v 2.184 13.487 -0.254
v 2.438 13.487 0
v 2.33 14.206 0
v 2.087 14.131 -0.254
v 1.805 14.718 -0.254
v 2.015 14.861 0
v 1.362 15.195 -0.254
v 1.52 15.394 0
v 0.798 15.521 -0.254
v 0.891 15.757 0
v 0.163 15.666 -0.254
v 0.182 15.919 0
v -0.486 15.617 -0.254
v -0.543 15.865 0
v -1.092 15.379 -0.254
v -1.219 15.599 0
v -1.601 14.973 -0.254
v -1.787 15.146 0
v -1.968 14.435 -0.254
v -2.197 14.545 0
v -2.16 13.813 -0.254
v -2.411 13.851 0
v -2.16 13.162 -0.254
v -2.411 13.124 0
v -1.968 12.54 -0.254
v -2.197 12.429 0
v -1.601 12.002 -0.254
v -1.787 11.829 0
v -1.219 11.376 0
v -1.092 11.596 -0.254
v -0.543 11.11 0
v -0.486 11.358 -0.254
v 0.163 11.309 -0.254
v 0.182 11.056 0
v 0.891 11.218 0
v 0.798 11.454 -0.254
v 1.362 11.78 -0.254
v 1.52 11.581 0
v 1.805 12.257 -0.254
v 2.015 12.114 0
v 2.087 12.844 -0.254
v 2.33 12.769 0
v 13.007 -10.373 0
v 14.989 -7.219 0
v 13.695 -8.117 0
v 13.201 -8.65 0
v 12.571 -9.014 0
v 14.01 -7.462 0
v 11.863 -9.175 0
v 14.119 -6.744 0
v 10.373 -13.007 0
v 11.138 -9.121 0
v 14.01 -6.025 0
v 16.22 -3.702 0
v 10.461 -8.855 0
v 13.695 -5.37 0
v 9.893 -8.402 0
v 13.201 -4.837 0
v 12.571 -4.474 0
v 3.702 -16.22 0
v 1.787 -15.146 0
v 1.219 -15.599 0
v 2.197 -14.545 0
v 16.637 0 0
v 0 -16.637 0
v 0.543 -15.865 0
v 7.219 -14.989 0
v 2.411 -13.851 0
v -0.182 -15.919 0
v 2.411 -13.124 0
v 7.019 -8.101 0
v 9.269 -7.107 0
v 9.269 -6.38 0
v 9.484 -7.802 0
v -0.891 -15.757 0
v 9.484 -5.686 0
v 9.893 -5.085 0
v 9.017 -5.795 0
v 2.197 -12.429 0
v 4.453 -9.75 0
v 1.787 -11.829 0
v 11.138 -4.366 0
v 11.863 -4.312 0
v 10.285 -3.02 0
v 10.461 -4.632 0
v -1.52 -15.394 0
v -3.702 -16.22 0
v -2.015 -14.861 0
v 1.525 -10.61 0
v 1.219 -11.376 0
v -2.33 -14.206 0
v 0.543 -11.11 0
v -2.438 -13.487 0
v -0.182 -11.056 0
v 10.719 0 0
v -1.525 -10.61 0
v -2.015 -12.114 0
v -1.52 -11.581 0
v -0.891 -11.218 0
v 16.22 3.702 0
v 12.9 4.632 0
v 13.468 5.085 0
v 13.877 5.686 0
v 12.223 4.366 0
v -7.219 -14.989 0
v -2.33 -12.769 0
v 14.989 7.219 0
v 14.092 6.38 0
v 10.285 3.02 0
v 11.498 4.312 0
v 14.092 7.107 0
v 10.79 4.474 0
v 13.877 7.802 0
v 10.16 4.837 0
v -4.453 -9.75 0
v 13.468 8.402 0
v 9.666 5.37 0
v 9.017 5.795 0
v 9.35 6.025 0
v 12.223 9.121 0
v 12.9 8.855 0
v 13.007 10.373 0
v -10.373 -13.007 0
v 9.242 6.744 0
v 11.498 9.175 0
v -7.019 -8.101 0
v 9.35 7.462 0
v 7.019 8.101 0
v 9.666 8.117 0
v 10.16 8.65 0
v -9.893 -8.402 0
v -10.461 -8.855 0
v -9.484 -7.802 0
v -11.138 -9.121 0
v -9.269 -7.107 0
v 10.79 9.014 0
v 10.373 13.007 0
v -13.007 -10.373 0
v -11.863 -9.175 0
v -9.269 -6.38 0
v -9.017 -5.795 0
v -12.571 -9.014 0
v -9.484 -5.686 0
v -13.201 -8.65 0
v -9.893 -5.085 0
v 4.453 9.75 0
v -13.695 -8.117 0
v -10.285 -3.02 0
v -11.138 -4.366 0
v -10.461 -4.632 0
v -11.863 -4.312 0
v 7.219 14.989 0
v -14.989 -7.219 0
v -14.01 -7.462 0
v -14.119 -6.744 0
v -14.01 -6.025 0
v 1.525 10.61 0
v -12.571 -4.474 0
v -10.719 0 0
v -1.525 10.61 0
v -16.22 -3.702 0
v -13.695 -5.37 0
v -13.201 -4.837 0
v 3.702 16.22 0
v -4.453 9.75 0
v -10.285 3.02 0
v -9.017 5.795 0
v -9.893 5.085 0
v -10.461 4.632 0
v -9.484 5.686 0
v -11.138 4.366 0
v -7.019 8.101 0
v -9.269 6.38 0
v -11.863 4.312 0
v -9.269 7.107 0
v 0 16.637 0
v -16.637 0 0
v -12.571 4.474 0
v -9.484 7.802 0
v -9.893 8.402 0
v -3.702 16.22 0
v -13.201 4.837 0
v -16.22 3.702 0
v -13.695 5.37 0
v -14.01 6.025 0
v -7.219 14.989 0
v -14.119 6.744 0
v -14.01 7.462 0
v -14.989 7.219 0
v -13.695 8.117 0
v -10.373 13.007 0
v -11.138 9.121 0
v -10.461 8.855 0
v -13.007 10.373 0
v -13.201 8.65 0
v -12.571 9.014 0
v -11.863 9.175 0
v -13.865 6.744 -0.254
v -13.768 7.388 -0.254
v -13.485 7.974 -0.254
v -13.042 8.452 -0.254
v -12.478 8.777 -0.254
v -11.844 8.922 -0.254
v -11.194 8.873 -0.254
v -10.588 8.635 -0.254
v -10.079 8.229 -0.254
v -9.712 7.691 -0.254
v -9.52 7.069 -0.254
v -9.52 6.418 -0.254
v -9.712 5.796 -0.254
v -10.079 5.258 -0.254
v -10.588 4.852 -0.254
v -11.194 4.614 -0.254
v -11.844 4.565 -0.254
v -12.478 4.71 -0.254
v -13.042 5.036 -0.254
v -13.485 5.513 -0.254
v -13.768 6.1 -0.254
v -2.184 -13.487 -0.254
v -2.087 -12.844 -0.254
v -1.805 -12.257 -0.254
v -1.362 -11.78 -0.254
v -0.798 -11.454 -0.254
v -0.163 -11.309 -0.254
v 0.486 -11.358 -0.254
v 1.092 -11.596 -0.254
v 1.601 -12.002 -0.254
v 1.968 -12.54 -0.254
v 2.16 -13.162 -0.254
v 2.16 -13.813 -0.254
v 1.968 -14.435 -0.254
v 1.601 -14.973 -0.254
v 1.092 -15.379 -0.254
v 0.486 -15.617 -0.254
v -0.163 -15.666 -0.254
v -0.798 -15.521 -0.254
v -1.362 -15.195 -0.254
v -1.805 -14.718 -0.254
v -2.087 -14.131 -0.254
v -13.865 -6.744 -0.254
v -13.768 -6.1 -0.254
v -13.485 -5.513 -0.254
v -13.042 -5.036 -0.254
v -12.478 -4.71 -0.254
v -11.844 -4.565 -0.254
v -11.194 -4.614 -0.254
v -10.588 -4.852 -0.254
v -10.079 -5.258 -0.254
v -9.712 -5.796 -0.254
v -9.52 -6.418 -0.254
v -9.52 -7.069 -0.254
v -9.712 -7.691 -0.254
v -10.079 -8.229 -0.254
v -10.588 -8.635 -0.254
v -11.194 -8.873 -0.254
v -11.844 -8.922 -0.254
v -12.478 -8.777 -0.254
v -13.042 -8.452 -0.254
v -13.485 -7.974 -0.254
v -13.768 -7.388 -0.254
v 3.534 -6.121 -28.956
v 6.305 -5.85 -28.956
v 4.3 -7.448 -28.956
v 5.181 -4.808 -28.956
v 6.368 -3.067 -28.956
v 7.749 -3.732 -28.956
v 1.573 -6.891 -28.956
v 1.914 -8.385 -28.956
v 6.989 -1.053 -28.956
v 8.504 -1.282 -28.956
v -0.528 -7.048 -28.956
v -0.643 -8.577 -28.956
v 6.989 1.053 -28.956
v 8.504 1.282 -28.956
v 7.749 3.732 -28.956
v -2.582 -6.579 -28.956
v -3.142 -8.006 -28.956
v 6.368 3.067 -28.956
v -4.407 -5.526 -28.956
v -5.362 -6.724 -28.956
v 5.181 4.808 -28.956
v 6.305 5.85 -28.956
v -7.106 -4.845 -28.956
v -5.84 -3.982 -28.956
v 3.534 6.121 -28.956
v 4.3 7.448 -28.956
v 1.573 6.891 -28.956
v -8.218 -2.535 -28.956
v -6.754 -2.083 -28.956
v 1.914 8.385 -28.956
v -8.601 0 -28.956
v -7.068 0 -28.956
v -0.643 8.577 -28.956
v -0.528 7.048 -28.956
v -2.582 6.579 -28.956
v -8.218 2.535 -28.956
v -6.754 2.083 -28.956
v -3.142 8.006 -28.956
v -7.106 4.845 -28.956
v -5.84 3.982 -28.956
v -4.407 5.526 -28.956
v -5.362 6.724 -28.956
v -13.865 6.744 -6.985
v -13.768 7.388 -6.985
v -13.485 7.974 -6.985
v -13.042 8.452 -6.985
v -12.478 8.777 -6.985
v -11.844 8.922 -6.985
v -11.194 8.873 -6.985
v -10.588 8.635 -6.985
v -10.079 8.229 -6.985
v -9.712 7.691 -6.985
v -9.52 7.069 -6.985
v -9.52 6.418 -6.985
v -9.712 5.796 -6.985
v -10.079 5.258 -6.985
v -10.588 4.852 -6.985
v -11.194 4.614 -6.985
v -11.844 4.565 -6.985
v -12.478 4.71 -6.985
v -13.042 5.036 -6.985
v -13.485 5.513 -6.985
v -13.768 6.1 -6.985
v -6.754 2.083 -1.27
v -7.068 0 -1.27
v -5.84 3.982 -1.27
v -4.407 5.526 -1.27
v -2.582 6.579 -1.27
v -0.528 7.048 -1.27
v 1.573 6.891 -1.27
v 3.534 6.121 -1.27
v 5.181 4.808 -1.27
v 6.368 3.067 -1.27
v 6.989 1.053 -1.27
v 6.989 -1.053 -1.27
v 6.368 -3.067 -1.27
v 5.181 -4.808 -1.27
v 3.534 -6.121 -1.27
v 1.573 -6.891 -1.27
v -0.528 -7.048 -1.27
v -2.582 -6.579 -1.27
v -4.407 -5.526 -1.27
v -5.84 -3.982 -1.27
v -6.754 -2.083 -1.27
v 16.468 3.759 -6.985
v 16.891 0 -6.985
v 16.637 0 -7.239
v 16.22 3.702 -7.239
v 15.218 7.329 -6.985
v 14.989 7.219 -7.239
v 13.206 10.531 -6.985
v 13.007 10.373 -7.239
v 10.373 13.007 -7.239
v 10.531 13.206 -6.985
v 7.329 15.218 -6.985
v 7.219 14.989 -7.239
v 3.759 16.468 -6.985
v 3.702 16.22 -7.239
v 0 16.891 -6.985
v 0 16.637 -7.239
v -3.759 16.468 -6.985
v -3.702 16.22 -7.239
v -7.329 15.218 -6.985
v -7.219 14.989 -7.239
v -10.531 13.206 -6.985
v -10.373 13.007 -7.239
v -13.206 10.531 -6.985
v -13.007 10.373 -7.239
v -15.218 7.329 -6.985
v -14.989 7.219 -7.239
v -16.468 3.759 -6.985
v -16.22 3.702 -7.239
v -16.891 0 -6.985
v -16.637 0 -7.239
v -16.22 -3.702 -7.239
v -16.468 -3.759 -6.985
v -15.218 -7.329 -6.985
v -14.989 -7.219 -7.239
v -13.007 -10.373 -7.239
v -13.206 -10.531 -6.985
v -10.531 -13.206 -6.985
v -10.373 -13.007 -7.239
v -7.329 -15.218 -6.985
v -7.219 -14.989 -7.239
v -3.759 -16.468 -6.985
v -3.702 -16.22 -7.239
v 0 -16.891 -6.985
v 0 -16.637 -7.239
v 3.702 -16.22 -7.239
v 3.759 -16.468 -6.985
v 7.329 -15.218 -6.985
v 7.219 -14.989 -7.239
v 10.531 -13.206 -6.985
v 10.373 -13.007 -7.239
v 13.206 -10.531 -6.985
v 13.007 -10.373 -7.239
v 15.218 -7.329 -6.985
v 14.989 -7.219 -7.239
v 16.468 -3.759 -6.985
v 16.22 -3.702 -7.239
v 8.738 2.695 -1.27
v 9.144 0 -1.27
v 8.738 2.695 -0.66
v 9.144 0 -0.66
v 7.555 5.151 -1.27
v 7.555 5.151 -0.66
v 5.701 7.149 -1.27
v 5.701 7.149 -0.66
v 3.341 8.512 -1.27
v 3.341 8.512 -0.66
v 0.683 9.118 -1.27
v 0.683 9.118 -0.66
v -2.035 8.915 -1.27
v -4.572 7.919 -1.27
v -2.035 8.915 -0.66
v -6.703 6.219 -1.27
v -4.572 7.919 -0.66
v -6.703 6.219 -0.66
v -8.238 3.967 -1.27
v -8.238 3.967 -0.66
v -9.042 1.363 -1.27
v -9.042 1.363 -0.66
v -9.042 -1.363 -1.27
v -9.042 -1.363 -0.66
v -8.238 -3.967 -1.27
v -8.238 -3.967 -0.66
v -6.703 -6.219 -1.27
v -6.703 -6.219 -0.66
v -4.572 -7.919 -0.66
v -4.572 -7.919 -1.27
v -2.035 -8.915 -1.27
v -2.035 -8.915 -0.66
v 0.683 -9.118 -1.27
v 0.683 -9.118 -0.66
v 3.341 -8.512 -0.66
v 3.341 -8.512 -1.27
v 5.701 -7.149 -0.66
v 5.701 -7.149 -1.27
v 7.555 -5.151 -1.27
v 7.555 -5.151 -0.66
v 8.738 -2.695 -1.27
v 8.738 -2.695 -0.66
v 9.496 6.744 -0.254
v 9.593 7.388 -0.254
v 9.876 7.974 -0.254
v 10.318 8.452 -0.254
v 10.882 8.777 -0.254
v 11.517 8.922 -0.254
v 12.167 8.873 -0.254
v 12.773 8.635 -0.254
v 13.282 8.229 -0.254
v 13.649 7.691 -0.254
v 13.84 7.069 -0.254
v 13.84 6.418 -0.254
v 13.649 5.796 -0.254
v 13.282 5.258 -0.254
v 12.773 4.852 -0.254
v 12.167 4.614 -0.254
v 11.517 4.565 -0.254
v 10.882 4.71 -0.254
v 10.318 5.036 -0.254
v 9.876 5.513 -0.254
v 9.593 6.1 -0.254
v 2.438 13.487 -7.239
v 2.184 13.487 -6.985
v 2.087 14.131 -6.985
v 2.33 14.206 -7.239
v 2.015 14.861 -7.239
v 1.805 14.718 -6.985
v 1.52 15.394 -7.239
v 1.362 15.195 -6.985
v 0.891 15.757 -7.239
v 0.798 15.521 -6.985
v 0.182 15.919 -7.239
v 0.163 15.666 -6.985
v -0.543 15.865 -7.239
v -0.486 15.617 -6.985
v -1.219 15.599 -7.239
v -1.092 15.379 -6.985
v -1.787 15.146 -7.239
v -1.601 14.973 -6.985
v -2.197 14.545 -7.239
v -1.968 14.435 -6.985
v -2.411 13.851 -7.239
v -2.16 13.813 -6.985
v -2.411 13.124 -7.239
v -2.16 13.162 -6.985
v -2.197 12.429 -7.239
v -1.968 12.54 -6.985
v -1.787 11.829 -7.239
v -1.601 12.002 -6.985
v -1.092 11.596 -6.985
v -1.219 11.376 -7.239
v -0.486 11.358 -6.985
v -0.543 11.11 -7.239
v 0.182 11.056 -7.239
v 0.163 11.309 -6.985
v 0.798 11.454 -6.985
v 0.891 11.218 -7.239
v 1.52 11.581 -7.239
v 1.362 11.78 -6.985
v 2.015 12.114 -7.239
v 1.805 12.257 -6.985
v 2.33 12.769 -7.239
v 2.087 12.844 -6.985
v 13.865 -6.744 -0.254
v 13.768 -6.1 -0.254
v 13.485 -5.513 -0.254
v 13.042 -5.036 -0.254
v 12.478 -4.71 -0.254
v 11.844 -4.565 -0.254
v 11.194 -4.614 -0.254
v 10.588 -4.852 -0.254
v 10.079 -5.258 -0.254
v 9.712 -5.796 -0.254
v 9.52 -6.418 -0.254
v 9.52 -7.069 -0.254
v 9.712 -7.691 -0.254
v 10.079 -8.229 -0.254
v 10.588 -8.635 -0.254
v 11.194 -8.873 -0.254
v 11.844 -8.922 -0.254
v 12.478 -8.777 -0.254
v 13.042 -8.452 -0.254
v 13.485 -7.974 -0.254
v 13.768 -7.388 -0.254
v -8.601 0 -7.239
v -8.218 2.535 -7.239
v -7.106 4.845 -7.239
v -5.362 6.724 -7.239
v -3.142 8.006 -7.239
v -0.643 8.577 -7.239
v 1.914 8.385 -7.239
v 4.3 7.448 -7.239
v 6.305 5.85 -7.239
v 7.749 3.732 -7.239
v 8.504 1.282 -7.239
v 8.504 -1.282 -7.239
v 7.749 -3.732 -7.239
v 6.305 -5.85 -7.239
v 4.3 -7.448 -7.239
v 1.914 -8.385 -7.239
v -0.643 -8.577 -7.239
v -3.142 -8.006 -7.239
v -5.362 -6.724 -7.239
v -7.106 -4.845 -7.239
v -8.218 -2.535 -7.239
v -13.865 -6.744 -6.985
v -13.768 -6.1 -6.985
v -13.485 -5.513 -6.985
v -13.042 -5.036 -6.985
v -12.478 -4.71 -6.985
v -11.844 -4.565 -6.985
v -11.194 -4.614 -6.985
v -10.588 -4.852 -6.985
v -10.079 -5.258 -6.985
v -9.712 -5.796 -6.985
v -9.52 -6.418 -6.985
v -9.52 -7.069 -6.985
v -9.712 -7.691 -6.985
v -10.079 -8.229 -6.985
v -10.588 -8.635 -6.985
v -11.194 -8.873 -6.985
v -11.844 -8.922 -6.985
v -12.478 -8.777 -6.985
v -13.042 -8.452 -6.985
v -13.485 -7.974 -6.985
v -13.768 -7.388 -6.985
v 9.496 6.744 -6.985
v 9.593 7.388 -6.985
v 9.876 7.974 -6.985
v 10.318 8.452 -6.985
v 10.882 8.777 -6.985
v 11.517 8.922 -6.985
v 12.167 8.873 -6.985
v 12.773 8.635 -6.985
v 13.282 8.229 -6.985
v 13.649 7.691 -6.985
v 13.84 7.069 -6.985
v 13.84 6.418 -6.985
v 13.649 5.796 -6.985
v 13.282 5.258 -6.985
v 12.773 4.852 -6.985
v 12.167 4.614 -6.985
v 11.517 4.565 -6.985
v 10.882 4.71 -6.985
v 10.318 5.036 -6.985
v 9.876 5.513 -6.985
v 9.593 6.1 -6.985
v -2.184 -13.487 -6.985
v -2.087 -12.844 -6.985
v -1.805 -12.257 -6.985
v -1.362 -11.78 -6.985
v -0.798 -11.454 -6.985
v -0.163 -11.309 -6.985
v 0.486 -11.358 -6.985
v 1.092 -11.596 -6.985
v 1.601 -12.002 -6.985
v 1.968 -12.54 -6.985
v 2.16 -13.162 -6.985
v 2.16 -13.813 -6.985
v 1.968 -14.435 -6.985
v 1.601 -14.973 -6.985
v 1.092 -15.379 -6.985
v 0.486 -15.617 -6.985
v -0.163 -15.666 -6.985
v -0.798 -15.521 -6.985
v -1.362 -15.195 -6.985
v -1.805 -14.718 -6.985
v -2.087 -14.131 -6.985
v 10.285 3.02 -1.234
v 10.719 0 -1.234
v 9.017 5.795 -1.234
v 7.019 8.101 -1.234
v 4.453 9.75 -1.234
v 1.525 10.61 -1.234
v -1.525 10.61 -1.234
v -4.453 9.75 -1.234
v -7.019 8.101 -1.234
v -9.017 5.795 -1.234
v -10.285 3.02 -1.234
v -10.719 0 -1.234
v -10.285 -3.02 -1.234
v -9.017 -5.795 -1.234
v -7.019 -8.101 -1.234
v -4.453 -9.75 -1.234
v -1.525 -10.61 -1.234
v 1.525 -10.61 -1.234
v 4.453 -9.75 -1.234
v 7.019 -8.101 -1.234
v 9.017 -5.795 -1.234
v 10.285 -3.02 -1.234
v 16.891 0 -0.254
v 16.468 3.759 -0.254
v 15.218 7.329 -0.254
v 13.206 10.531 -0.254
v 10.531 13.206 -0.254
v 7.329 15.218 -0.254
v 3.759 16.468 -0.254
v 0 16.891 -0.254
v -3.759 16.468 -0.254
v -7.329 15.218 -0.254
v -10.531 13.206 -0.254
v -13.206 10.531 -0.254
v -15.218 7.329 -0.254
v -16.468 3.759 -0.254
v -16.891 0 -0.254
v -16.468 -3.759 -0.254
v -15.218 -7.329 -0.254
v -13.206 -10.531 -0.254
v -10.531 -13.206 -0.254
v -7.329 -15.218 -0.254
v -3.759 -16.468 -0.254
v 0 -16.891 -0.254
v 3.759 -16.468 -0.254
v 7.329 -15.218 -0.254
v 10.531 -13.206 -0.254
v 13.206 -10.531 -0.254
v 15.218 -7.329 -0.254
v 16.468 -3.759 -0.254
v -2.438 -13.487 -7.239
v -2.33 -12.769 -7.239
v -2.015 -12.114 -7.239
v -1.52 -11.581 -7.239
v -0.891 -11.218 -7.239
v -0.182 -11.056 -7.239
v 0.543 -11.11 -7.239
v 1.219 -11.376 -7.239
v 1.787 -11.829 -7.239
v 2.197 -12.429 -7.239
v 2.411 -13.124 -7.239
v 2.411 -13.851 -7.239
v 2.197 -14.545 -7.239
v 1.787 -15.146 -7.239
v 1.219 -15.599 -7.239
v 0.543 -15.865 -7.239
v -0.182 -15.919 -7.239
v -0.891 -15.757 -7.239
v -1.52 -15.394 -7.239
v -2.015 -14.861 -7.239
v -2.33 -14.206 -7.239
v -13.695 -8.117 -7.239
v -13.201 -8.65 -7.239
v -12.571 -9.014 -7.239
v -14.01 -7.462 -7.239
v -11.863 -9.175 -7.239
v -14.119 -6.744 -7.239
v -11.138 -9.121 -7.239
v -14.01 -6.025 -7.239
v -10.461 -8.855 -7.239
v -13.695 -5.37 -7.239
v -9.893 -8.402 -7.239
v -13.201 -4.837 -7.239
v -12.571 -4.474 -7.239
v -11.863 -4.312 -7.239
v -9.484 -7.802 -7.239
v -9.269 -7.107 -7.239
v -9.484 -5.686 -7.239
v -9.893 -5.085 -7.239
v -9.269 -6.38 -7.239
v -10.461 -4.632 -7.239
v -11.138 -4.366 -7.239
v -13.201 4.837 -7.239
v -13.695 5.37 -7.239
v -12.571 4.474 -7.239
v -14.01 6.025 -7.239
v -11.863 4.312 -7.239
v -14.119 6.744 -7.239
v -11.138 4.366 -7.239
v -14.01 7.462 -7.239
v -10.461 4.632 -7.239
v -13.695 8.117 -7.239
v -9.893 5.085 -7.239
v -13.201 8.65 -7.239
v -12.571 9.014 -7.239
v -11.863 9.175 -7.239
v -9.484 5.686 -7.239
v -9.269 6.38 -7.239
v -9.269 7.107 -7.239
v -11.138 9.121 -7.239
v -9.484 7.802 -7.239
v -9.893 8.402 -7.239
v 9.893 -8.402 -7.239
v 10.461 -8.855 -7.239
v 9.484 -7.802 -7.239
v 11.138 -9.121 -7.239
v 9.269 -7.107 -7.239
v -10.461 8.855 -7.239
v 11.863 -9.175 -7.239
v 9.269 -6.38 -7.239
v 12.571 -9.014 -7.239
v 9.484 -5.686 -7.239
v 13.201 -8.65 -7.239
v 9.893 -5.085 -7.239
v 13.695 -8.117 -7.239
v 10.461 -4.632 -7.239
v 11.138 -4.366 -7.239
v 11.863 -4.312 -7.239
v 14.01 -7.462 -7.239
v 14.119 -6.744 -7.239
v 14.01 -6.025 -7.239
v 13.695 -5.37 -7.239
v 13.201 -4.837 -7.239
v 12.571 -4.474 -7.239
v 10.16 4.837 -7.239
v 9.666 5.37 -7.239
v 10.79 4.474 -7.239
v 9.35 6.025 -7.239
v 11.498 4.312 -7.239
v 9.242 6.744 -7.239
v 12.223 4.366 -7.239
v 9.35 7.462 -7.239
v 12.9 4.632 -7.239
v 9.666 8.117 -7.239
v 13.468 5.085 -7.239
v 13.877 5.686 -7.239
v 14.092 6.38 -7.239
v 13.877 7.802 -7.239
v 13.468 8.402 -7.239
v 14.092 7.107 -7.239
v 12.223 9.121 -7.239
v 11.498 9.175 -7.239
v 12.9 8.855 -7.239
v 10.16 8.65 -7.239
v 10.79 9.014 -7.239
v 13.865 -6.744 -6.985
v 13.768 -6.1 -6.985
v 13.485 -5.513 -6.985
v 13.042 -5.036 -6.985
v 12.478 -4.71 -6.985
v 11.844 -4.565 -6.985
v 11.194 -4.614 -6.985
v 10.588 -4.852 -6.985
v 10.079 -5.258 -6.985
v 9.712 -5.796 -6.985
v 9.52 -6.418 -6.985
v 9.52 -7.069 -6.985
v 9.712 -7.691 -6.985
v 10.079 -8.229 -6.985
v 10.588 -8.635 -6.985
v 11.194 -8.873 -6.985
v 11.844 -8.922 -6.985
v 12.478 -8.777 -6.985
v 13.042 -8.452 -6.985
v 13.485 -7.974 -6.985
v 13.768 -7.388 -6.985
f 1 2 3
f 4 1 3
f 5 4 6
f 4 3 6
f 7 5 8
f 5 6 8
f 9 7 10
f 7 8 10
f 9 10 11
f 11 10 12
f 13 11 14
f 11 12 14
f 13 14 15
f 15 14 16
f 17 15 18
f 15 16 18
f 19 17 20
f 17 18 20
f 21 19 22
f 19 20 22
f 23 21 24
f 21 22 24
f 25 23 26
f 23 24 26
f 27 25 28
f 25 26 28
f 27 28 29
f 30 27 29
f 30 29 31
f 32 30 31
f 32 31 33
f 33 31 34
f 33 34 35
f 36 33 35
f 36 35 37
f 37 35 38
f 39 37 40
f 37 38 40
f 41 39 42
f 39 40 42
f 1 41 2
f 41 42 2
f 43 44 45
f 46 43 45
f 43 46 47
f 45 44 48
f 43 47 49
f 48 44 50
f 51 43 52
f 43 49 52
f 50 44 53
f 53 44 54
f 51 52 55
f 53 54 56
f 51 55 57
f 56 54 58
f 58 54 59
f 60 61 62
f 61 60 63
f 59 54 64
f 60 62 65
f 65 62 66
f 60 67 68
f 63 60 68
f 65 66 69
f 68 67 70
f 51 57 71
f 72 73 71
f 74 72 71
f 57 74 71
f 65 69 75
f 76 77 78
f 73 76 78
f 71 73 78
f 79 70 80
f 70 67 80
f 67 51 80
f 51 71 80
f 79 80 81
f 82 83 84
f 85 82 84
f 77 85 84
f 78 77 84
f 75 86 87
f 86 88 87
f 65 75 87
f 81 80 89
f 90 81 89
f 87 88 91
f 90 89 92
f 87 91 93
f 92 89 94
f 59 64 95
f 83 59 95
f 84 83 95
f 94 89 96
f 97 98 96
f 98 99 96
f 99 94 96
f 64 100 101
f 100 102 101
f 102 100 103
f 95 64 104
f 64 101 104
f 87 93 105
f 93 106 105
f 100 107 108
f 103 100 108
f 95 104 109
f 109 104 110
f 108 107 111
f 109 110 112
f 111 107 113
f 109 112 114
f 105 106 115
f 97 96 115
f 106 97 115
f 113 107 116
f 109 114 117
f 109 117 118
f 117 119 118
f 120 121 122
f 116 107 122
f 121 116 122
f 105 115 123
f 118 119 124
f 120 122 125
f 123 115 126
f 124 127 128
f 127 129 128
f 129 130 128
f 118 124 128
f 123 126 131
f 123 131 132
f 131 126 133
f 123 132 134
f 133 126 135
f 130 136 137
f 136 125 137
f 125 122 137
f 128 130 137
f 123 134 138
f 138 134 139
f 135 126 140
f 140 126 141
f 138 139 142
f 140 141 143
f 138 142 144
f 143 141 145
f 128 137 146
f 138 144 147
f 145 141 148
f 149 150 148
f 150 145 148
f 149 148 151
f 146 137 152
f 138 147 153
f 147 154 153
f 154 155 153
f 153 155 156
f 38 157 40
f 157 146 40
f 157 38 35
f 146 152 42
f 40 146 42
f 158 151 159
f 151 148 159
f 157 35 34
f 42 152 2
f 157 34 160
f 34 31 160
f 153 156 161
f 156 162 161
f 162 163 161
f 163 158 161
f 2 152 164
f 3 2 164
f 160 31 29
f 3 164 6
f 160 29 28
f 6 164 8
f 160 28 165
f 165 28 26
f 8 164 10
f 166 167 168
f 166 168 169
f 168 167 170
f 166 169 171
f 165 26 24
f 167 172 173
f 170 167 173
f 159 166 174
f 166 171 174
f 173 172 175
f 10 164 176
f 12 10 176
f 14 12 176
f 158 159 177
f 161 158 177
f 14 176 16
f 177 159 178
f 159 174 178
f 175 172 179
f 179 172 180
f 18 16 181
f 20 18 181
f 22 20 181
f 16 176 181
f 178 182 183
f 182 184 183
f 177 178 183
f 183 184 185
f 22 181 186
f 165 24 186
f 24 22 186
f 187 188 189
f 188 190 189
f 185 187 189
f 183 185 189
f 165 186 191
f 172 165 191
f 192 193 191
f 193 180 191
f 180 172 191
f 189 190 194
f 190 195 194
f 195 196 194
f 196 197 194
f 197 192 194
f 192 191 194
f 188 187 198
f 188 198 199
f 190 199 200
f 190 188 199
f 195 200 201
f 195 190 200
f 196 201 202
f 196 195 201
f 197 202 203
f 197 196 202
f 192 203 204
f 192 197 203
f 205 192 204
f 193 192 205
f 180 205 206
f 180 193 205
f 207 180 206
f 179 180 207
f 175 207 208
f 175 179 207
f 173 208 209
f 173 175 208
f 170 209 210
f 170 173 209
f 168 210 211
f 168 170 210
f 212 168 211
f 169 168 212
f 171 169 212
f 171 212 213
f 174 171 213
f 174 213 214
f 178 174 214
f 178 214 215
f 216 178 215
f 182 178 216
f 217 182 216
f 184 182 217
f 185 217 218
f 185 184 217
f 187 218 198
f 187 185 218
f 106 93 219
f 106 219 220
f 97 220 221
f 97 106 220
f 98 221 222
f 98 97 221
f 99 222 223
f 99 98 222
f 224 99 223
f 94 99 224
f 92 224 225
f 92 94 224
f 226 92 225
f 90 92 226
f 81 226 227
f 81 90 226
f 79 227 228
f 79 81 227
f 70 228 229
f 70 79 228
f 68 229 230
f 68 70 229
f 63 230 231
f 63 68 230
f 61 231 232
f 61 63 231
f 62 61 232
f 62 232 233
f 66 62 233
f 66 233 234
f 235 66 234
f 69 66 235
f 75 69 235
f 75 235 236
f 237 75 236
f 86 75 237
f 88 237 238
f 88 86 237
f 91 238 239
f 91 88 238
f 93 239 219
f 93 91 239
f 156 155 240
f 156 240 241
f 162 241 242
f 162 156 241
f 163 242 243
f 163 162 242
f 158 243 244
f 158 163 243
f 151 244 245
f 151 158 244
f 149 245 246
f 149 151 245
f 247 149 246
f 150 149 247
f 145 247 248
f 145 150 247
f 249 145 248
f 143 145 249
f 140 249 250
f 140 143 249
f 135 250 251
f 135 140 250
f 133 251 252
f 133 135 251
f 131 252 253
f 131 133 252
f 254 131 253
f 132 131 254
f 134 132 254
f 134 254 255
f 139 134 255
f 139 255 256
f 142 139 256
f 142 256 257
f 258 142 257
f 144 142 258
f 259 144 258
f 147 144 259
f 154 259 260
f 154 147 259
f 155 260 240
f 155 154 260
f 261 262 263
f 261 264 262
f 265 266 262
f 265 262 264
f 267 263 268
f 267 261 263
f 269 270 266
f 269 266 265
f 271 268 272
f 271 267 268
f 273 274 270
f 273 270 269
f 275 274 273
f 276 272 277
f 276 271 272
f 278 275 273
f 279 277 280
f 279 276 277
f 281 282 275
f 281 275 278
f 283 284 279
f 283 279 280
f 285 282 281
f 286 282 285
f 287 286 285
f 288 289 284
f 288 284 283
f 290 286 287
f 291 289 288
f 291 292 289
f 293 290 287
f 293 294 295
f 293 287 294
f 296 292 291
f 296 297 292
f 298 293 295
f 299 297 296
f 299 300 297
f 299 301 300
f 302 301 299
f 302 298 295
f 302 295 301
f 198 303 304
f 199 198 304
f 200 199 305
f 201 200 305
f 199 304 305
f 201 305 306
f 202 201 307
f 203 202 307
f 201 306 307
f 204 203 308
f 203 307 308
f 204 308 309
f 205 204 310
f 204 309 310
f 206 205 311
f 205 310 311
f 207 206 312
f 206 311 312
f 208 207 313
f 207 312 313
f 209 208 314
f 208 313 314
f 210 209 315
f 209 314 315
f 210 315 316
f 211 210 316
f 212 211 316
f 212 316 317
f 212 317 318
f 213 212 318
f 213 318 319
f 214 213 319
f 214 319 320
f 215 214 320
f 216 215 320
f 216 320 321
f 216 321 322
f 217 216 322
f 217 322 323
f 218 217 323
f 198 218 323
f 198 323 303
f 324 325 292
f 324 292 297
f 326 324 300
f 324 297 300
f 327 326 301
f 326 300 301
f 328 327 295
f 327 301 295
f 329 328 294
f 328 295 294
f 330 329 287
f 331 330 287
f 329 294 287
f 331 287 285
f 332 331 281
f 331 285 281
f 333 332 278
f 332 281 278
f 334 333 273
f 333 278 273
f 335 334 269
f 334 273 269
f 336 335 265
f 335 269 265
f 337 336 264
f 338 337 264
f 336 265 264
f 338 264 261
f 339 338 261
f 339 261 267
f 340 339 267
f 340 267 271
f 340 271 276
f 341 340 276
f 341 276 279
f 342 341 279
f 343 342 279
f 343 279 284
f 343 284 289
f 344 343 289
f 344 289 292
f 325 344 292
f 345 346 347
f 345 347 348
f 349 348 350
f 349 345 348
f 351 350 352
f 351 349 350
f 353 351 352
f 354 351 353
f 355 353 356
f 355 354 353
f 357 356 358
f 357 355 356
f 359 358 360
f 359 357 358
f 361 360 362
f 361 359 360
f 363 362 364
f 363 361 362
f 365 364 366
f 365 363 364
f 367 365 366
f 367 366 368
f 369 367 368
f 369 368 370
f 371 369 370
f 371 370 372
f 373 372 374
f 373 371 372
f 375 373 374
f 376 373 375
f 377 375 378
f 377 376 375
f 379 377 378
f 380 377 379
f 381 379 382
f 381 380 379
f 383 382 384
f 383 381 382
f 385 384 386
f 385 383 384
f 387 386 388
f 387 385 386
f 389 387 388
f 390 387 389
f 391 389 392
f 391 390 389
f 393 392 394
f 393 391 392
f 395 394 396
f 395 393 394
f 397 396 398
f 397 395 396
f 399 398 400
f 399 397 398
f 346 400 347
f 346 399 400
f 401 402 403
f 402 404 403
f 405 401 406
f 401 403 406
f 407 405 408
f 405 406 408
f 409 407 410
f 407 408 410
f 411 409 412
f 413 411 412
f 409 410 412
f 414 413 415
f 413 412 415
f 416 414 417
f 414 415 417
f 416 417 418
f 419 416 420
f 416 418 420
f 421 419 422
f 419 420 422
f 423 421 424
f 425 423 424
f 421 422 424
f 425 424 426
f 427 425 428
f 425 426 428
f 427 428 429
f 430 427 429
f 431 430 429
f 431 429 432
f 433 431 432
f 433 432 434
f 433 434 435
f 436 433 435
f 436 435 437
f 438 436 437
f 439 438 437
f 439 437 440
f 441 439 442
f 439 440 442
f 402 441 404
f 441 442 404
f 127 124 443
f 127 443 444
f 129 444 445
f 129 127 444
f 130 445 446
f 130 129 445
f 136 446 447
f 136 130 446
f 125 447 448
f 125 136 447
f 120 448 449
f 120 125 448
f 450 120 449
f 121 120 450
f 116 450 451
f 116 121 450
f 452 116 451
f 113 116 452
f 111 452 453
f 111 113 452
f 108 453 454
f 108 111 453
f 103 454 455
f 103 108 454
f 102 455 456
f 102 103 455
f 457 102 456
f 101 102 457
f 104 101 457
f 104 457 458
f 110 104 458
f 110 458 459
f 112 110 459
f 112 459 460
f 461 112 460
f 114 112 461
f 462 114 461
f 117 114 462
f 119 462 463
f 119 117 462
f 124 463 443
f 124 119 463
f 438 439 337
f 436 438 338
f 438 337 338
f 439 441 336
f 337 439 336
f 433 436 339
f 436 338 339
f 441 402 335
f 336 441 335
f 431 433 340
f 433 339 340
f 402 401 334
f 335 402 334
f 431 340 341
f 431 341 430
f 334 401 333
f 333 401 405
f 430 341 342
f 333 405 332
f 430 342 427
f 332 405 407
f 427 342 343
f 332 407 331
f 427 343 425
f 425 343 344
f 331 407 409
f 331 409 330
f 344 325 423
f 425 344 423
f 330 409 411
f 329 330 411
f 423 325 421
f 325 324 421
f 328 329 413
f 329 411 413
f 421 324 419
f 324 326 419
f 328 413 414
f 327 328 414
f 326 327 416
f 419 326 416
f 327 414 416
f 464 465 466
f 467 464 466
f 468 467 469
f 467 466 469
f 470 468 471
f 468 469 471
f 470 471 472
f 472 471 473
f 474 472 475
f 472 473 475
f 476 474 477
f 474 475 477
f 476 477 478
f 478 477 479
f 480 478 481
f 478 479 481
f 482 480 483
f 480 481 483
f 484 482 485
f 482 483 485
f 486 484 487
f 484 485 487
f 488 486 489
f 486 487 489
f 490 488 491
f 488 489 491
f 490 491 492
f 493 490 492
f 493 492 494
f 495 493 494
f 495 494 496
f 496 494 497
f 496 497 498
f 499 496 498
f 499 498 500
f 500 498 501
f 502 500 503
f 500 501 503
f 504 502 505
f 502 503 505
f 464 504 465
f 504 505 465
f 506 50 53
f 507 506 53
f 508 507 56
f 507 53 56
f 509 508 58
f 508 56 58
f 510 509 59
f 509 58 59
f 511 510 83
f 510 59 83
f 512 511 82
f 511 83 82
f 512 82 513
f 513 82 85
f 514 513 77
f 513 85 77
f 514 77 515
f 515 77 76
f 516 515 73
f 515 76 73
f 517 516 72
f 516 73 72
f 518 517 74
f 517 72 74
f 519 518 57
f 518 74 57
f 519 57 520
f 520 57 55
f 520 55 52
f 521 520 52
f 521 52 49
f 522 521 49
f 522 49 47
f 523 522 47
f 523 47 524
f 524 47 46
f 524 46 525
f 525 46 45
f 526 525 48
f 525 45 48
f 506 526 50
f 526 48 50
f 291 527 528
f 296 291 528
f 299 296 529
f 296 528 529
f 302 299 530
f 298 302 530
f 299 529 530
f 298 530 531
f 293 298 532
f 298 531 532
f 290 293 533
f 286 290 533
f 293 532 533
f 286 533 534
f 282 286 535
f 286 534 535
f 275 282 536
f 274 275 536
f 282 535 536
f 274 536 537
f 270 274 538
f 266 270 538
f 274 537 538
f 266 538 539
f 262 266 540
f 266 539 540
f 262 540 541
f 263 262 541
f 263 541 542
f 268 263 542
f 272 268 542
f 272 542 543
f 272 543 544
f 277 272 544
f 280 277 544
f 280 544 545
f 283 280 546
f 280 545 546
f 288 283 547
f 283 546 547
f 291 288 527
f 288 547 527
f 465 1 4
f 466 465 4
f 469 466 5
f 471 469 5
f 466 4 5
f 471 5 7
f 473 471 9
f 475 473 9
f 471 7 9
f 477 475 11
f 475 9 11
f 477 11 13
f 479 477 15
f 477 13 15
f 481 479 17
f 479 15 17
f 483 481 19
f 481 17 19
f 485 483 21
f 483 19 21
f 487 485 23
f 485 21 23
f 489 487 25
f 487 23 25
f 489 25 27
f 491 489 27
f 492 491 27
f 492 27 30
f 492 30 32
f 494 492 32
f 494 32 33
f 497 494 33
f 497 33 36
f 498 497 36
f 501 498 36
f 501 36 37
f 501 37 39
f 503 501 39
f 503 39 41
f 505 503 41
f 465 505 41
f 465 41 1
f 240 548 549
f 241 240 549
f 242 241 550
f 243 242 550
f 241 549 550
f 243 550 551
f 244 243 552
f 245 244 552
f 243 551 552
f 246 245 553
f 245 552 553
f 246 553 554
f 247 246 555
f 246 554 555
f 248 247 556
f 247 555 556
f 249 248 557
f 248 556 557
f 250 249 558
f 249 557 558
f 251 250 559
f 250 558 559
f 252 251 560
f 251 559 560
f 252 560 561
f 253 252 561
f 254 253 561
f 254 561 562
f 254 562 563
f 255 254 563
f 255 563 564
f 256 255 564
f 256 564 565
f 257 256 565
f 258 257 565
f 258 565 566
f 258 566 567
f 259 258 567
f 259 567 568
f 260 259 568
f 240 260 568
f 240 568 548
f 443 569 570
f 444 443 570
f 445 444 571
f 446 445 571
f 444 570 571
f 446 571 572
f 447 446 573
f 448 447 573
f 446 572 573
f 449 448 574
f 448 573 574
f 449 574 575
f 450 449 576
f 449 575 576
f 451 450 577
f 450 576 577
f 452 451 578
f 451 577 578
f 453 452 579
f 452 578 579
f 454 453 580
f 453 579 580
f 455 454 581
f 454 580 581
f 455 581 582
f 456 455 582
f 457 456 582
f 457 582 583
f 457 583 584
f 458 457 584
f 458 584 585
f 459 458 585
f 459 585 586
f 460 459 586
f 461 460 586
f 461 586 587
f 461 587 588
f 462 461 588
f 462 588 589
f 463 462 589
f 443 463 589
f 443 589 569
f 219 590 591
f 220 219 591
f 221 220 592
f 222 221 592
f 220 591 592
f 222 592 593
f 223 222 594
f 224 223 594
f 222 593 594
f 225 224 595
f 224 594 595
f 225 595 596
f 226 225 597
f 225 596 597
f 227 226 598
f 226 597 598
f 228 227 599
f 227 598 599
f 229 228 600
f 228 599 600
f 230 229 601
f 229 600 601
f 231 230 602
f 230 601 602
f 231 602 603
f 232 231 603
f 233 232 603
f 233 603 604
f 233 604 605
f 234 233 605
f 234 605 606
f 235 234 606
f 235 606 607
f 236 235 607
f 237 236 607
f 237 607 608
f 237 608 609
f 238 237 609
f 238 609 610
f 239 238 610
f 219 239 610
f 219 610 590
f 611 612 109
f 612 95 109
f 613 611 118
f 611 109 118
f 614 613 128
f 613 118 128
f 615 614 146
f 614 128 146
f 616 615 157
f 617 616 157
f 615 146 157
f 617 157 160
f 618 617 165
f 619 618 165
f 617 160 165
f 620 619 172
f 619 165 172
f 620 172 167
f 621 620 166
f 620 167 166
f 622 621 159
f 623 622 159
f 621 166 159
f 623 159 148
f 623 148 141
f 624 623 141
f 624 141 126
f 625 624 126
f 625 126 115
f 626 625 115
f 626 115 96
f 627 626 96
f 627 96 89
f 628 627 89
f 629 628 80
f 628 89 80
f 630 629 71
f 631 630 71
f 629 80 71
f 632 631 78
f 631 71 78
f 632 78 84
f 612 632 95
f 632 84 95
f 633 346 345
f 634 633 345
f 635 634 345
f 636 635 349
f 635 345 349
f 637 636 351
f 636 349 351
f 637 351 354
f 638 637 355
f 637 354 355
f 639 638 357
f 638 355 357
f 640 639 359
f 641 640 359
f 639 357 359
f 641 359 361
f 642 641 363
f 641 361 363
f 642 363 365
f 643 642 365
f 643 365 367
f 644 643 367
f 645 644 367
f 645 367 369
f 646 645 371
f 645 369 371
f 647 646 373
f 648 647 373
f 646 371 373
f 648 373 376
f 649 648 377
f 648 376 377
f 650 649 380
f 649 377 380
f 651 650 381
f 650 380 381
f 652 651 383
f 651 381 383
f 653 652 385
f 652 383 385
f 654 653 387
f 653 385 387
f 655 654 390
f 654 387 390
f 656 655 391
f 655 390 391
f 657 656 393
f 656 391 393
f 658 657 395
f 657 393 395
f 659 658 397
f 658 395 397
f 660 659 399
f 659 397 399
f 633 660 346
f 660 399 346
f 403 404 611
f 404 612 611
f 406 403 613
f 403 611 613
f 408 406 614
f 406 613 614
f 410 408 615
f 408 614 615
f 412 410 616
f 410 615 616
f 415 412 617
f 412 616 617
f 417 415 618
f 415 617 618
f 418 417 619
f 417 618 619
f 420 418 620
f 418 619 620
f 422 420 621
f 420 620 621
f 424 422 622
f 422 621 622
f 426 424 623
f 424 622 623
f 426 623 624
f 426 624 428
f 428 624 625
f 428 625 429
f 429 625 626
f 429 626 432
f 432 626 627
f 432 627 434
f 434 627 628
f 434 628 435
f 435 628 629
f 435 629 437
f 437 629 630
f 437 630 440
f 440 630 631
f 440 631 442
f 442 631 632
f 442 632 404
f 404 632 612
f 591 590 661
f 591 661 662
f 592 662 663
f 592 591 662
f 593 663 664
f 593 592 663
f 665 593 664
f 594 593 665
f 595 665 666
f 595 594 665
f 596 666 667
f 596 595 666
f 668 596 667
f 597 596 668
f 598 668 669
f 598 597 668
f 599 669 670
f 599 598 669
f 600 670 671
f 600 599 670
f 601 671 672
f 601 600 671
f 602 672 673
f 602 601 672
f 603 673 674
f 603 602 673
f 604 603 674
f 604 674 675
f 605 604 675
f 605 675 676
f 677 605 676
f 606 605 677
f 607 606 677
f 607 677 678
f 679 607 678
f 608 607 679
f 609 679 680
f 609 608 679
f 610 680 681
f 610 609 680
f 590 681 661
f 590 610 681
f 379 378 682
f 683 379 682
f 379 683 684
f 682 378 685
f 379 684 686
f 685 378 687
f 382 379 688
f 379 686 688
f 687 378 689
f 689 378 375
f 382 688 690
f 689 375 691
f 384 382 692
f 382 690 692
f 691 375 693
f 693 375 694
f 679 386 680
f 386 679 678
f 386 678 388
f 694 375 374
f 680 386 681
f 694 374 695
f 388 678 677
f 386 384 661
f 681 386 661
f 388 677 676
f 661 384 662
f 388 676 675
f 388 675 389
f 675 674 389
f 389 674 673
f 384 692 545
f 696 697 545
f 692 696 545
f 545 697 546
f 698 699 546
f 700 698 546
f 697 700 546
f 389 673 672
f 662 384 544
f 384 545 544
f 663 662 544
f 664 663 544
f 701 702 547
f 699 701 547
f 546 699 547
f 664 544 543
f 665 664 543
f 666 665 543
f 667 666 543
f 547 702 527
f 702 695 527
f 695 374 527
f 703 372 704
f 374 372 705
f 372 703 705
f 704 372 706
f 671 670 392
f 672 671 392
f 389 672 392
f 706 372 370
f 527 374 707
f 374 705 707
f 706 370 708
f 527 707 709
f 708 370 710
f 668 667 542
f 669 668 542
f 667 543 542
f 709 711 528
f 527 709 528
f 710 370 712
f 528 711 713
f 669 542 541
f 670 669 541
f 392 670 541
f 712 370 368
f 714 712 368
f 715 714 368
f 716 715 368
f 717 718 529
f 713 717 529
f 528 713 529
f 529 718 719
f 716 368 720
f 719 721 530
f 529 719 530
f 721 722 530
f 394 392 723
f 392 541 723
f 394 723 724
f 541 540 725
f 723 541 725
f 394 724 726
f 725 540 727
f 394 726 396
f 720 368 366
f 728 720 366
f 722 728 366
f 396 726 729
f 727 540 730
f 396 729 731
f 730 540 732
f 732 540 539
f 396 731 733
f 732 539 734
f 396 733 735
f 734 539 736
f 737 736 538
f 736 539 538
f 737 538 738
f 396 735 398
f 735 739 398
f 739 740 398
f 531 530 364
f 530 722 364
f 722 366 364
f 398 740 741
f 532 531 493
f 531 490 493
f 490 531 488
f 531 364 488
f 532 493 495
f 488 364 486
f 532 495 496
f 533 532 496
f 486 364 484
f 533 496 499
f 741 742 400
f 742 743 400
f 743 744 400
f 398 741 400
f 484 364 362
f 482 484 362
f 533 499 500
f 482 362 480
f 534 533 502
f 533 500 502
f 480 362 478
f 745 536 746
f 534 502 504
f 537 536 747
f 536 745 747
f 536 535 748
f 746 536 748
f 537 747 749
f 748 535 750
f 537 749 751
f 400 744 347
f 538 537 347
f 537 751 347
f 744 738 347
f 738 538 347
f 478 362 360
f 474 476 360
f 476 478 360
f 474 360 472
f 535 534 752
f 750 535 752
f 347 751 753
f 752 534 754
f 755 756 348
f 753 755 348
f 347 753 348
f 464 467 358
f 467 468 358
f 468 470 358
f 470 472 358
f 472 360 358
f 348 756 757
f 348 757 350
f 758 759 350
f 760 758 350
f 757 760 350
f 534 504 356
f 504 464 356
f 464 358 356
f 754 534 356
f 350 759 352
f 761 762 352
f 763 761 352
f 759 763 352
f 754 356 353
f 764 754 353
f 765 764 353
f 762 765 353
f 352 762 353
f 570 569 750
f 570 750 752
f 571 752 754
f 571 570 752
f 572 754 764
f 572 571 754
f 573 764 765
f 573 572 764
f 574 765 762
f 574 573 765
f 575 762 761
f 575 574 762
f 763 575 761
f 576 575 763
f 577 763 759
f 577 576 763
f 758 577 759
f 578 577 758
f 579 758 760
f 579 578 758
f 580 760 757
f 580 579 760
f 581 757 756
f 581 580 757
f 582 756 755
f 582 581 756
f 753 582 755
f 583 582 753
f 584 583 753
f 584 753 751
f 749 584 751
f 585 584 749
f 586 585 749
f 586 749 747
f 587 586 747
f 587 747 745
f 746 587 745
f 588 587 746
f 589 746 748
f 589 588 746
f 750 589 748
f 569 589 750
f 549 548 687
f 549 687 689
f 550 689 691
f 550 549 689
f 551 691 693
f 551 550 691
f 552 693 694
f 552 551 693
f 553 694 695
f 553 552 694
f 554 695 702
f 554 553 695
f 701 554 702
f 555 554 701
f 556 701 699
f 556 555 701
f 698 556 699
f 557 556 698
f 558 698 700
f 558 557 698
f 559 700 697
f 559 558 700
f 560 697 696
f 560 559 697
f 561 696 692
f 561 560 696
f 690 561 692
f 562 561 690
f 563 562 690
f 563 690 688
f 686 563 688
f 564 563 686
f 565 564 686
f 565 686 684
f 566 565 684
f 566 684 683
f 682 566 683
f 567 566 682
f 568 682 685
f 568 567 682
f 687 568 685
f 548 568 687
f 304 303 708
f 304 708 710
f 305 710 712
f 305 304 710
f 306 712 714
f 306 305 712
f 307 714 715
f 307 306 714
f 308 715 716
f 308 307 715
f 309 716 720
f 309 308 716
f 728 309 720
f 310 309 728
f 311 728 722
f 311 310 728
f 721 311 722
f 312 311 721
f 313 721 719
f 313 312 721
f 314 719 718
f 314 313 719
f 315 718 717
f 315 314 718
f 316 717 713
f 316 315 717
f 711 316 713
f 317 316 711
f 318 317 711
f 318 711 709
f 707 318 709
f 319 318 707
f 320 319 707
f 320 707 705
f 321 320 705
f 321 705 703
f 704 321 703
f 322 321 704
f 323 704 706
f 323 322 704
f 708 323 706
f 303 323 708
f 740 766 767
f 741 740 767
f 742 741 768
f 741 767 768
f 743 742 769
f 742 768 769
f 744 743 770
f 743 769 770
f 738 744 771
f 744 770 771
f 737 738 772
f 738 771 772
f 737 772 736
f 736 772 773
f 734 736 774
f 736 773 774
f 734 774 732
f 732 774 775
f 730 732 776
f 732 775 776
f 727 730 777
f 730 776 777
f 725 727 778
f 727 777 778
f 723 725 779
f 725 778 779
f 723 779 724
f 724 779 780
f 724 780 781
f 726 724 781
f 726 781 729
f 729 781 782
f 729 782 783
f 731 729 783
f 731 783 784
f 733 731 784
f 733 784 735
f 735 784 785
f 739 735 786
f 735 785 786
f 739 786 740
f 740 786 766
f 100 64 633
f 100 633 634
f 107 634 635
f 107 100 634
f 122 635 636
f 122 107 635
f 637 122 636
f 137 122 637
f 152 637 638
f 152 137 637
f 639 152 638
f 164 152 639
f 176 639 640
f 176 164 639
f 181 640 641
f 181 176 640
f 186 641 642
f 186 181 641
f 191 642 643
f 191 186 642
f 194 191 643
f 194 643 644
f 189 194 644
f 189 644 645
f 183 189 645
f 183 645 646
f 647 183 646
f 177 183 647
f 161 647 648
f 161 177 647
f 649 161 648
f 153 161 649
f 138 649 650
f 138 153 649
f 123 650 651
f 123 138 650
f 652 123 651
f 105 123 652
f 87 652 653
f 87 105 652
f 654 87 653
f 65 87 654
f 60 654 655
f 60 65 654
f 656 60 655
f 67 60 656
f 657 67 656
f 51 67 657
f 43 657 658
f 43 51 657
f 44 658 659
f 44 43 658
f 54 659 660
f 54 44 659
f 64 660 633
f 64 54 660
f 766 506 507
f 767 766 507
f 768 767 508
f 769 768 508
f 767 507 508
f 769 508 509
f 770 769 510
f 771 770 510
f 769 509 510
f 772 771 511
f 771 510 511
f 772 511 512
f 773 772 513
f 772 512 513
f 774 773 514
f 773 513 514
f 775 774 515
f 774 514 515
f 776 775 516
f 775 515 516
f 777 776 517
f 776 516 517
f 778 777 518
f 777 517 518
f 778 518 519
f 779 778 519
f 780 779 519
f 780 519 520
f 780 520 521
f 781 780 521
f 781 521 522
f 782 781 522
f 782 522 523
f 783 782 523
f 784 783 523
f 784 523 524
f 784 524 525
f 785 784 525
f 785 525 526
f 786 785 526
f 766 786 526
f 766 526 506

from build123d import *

# Parameters (mm, degrees)
M8_CLEARANCE_HOLE1_D     = 9.5758
M8_CLEARANCE_HOLE1_DEPTH = 7.239
M4_CLEARANCE_HOLE1_D     = 4.3688
M4_CLEARANCE_HOLE1_DEPTH = 7.239
M4_CLEARANCE_HOLE2_D     = 4.3688
M4_CLEARANCE_HOLE2_DEPTH = 7.239
CHAMFER1_SIZE            = 0.254
SKETCH8_R                = 8.600554372
BOSS_EXTRUDE1_DEPTH      = 21.717
SKETCH9_R                = 7.068084354
CUT_EXTRUDE1_DEPTH       = 29.956


with BuildPart() as part:
    # Sketch1 → Revolve1 (revolve)
    with BuildSketch(Plane(origin=(0, 0, 0), x_dir=(1, 0, 0), z_dir=(0, 1, 0))):
        with BuildLine():
            Line((16.891, 7.239), (0, 7.239))
            Line((0, 7.239), (0, 1.27))
            Line((0, 1.27), (5.321088826, 1.27))
            ThreePointArc((5.321088826, 1.27), (6.0579, 1.83769793), (6.794711174, 1.27))
            Line((6.794711174, 1.27), (9.144, 1.27))
            Line((9.144, 1.27), (9.144, 0.6604))
            Line((9.144, 0.6604), (10.7188, 1.233580325))
            Line((10.7188, 1.233580325), (10.7188, 0))
            Line((10.7188, 0), (16.891, 0))
            Line((16.891, 0), (16.891, 7.239))
        make_face()
    revolve(axis=Axis((0, 0, -7.239), (0, 0, 1)))

    # M8 Clearance Hole1
    with Locations(Plane(origin=(0, 0, -7.239), x_dir=(-1, 0, 0), z_dir=(0, 0, -1))):
        with Locations((0, 0)):
            Hole(M8_CLEARANCE_HOLE1_D / 2, depth=M8_CLEARANCE_HOLE1_DEPTH)

    # M4 Clearance Hole1
    with Locations(Plane.XY):
        with Locations((11.680431031, 6.7437), (0, -13.4874), (-11.680431031, -6.7437), (-11.680431031, 6.7437)):
            Hole(M4_CLEARANCE_HOLE1_D / 2, depth=M4_CLEARANCE_HOLE1_DEPTH)

    # M4 Clearance Hole2
    with Locations(Plane(origin=(0, 0, -7.239), x_dir=(-1, 0, 0), z_dir=(0, 0, -1))):
        with Locations((0, 13.4874), (-11.680431031, -6.7437)):
            Hole(M4_CLEARANCE_HOLE2_D / 2, depth=M4_CLEARANCE_HOLE2_DEPTH)

    # Chamfer1
    chamfer1_edges = [part.edges().sort_by_distance(p)[0] for p in [
        (-16.891, 0, 0),
        (-9.496031031, 6.7437, 0),
        (-9.496031031, 6.7437, -7.239),
        (-9.496031031, -6.7437, 0),
        (-9.496031031, -6.7437, -7.239),
        (2.1844, -13.4874, 0),
        (2.1844, -13.4874, -7.239),
        (13.864831031, 6.7437, 0),
        (13.864831031, 6.7437, -7.239),
        (9.496031031, -6.7437, -7.239),
        (9.496031031, -6.7437, 0),
        (-2.1844, 13.4874, -7.239),
        (-2.1844, 13.4874, 0),
        (-16.891, 0, -7.239),
    ]]
    chamfer(chamfer1_edges, length=CHAMFER1_SIZE)

    # Sketch8 → Boss-Extrude1 (add)
    with BuildSketch(Plane(origin=(0, 0, -7.239), x_dir=(-1, 0, 0), z_dir=(0, 0, -1))):
        Circle(SKETCH8_R)
    extrude(amount=BOSS_EXTRUDE1_DEPTH)

    # Sketch9 → Cut-Extrude1 (cut, through all)
    with BuildSketch(Plane(origin=(0, 0, -28.956), x_dir=(-1, 0, 0), z_dir=(0, 0, -1))):
        Circle(SKETCH9_R)
    extrude(amount=-CUT_EXTRUDE1_DEPTH, mode=Mode.SUBTRACT)


solid = part.part
